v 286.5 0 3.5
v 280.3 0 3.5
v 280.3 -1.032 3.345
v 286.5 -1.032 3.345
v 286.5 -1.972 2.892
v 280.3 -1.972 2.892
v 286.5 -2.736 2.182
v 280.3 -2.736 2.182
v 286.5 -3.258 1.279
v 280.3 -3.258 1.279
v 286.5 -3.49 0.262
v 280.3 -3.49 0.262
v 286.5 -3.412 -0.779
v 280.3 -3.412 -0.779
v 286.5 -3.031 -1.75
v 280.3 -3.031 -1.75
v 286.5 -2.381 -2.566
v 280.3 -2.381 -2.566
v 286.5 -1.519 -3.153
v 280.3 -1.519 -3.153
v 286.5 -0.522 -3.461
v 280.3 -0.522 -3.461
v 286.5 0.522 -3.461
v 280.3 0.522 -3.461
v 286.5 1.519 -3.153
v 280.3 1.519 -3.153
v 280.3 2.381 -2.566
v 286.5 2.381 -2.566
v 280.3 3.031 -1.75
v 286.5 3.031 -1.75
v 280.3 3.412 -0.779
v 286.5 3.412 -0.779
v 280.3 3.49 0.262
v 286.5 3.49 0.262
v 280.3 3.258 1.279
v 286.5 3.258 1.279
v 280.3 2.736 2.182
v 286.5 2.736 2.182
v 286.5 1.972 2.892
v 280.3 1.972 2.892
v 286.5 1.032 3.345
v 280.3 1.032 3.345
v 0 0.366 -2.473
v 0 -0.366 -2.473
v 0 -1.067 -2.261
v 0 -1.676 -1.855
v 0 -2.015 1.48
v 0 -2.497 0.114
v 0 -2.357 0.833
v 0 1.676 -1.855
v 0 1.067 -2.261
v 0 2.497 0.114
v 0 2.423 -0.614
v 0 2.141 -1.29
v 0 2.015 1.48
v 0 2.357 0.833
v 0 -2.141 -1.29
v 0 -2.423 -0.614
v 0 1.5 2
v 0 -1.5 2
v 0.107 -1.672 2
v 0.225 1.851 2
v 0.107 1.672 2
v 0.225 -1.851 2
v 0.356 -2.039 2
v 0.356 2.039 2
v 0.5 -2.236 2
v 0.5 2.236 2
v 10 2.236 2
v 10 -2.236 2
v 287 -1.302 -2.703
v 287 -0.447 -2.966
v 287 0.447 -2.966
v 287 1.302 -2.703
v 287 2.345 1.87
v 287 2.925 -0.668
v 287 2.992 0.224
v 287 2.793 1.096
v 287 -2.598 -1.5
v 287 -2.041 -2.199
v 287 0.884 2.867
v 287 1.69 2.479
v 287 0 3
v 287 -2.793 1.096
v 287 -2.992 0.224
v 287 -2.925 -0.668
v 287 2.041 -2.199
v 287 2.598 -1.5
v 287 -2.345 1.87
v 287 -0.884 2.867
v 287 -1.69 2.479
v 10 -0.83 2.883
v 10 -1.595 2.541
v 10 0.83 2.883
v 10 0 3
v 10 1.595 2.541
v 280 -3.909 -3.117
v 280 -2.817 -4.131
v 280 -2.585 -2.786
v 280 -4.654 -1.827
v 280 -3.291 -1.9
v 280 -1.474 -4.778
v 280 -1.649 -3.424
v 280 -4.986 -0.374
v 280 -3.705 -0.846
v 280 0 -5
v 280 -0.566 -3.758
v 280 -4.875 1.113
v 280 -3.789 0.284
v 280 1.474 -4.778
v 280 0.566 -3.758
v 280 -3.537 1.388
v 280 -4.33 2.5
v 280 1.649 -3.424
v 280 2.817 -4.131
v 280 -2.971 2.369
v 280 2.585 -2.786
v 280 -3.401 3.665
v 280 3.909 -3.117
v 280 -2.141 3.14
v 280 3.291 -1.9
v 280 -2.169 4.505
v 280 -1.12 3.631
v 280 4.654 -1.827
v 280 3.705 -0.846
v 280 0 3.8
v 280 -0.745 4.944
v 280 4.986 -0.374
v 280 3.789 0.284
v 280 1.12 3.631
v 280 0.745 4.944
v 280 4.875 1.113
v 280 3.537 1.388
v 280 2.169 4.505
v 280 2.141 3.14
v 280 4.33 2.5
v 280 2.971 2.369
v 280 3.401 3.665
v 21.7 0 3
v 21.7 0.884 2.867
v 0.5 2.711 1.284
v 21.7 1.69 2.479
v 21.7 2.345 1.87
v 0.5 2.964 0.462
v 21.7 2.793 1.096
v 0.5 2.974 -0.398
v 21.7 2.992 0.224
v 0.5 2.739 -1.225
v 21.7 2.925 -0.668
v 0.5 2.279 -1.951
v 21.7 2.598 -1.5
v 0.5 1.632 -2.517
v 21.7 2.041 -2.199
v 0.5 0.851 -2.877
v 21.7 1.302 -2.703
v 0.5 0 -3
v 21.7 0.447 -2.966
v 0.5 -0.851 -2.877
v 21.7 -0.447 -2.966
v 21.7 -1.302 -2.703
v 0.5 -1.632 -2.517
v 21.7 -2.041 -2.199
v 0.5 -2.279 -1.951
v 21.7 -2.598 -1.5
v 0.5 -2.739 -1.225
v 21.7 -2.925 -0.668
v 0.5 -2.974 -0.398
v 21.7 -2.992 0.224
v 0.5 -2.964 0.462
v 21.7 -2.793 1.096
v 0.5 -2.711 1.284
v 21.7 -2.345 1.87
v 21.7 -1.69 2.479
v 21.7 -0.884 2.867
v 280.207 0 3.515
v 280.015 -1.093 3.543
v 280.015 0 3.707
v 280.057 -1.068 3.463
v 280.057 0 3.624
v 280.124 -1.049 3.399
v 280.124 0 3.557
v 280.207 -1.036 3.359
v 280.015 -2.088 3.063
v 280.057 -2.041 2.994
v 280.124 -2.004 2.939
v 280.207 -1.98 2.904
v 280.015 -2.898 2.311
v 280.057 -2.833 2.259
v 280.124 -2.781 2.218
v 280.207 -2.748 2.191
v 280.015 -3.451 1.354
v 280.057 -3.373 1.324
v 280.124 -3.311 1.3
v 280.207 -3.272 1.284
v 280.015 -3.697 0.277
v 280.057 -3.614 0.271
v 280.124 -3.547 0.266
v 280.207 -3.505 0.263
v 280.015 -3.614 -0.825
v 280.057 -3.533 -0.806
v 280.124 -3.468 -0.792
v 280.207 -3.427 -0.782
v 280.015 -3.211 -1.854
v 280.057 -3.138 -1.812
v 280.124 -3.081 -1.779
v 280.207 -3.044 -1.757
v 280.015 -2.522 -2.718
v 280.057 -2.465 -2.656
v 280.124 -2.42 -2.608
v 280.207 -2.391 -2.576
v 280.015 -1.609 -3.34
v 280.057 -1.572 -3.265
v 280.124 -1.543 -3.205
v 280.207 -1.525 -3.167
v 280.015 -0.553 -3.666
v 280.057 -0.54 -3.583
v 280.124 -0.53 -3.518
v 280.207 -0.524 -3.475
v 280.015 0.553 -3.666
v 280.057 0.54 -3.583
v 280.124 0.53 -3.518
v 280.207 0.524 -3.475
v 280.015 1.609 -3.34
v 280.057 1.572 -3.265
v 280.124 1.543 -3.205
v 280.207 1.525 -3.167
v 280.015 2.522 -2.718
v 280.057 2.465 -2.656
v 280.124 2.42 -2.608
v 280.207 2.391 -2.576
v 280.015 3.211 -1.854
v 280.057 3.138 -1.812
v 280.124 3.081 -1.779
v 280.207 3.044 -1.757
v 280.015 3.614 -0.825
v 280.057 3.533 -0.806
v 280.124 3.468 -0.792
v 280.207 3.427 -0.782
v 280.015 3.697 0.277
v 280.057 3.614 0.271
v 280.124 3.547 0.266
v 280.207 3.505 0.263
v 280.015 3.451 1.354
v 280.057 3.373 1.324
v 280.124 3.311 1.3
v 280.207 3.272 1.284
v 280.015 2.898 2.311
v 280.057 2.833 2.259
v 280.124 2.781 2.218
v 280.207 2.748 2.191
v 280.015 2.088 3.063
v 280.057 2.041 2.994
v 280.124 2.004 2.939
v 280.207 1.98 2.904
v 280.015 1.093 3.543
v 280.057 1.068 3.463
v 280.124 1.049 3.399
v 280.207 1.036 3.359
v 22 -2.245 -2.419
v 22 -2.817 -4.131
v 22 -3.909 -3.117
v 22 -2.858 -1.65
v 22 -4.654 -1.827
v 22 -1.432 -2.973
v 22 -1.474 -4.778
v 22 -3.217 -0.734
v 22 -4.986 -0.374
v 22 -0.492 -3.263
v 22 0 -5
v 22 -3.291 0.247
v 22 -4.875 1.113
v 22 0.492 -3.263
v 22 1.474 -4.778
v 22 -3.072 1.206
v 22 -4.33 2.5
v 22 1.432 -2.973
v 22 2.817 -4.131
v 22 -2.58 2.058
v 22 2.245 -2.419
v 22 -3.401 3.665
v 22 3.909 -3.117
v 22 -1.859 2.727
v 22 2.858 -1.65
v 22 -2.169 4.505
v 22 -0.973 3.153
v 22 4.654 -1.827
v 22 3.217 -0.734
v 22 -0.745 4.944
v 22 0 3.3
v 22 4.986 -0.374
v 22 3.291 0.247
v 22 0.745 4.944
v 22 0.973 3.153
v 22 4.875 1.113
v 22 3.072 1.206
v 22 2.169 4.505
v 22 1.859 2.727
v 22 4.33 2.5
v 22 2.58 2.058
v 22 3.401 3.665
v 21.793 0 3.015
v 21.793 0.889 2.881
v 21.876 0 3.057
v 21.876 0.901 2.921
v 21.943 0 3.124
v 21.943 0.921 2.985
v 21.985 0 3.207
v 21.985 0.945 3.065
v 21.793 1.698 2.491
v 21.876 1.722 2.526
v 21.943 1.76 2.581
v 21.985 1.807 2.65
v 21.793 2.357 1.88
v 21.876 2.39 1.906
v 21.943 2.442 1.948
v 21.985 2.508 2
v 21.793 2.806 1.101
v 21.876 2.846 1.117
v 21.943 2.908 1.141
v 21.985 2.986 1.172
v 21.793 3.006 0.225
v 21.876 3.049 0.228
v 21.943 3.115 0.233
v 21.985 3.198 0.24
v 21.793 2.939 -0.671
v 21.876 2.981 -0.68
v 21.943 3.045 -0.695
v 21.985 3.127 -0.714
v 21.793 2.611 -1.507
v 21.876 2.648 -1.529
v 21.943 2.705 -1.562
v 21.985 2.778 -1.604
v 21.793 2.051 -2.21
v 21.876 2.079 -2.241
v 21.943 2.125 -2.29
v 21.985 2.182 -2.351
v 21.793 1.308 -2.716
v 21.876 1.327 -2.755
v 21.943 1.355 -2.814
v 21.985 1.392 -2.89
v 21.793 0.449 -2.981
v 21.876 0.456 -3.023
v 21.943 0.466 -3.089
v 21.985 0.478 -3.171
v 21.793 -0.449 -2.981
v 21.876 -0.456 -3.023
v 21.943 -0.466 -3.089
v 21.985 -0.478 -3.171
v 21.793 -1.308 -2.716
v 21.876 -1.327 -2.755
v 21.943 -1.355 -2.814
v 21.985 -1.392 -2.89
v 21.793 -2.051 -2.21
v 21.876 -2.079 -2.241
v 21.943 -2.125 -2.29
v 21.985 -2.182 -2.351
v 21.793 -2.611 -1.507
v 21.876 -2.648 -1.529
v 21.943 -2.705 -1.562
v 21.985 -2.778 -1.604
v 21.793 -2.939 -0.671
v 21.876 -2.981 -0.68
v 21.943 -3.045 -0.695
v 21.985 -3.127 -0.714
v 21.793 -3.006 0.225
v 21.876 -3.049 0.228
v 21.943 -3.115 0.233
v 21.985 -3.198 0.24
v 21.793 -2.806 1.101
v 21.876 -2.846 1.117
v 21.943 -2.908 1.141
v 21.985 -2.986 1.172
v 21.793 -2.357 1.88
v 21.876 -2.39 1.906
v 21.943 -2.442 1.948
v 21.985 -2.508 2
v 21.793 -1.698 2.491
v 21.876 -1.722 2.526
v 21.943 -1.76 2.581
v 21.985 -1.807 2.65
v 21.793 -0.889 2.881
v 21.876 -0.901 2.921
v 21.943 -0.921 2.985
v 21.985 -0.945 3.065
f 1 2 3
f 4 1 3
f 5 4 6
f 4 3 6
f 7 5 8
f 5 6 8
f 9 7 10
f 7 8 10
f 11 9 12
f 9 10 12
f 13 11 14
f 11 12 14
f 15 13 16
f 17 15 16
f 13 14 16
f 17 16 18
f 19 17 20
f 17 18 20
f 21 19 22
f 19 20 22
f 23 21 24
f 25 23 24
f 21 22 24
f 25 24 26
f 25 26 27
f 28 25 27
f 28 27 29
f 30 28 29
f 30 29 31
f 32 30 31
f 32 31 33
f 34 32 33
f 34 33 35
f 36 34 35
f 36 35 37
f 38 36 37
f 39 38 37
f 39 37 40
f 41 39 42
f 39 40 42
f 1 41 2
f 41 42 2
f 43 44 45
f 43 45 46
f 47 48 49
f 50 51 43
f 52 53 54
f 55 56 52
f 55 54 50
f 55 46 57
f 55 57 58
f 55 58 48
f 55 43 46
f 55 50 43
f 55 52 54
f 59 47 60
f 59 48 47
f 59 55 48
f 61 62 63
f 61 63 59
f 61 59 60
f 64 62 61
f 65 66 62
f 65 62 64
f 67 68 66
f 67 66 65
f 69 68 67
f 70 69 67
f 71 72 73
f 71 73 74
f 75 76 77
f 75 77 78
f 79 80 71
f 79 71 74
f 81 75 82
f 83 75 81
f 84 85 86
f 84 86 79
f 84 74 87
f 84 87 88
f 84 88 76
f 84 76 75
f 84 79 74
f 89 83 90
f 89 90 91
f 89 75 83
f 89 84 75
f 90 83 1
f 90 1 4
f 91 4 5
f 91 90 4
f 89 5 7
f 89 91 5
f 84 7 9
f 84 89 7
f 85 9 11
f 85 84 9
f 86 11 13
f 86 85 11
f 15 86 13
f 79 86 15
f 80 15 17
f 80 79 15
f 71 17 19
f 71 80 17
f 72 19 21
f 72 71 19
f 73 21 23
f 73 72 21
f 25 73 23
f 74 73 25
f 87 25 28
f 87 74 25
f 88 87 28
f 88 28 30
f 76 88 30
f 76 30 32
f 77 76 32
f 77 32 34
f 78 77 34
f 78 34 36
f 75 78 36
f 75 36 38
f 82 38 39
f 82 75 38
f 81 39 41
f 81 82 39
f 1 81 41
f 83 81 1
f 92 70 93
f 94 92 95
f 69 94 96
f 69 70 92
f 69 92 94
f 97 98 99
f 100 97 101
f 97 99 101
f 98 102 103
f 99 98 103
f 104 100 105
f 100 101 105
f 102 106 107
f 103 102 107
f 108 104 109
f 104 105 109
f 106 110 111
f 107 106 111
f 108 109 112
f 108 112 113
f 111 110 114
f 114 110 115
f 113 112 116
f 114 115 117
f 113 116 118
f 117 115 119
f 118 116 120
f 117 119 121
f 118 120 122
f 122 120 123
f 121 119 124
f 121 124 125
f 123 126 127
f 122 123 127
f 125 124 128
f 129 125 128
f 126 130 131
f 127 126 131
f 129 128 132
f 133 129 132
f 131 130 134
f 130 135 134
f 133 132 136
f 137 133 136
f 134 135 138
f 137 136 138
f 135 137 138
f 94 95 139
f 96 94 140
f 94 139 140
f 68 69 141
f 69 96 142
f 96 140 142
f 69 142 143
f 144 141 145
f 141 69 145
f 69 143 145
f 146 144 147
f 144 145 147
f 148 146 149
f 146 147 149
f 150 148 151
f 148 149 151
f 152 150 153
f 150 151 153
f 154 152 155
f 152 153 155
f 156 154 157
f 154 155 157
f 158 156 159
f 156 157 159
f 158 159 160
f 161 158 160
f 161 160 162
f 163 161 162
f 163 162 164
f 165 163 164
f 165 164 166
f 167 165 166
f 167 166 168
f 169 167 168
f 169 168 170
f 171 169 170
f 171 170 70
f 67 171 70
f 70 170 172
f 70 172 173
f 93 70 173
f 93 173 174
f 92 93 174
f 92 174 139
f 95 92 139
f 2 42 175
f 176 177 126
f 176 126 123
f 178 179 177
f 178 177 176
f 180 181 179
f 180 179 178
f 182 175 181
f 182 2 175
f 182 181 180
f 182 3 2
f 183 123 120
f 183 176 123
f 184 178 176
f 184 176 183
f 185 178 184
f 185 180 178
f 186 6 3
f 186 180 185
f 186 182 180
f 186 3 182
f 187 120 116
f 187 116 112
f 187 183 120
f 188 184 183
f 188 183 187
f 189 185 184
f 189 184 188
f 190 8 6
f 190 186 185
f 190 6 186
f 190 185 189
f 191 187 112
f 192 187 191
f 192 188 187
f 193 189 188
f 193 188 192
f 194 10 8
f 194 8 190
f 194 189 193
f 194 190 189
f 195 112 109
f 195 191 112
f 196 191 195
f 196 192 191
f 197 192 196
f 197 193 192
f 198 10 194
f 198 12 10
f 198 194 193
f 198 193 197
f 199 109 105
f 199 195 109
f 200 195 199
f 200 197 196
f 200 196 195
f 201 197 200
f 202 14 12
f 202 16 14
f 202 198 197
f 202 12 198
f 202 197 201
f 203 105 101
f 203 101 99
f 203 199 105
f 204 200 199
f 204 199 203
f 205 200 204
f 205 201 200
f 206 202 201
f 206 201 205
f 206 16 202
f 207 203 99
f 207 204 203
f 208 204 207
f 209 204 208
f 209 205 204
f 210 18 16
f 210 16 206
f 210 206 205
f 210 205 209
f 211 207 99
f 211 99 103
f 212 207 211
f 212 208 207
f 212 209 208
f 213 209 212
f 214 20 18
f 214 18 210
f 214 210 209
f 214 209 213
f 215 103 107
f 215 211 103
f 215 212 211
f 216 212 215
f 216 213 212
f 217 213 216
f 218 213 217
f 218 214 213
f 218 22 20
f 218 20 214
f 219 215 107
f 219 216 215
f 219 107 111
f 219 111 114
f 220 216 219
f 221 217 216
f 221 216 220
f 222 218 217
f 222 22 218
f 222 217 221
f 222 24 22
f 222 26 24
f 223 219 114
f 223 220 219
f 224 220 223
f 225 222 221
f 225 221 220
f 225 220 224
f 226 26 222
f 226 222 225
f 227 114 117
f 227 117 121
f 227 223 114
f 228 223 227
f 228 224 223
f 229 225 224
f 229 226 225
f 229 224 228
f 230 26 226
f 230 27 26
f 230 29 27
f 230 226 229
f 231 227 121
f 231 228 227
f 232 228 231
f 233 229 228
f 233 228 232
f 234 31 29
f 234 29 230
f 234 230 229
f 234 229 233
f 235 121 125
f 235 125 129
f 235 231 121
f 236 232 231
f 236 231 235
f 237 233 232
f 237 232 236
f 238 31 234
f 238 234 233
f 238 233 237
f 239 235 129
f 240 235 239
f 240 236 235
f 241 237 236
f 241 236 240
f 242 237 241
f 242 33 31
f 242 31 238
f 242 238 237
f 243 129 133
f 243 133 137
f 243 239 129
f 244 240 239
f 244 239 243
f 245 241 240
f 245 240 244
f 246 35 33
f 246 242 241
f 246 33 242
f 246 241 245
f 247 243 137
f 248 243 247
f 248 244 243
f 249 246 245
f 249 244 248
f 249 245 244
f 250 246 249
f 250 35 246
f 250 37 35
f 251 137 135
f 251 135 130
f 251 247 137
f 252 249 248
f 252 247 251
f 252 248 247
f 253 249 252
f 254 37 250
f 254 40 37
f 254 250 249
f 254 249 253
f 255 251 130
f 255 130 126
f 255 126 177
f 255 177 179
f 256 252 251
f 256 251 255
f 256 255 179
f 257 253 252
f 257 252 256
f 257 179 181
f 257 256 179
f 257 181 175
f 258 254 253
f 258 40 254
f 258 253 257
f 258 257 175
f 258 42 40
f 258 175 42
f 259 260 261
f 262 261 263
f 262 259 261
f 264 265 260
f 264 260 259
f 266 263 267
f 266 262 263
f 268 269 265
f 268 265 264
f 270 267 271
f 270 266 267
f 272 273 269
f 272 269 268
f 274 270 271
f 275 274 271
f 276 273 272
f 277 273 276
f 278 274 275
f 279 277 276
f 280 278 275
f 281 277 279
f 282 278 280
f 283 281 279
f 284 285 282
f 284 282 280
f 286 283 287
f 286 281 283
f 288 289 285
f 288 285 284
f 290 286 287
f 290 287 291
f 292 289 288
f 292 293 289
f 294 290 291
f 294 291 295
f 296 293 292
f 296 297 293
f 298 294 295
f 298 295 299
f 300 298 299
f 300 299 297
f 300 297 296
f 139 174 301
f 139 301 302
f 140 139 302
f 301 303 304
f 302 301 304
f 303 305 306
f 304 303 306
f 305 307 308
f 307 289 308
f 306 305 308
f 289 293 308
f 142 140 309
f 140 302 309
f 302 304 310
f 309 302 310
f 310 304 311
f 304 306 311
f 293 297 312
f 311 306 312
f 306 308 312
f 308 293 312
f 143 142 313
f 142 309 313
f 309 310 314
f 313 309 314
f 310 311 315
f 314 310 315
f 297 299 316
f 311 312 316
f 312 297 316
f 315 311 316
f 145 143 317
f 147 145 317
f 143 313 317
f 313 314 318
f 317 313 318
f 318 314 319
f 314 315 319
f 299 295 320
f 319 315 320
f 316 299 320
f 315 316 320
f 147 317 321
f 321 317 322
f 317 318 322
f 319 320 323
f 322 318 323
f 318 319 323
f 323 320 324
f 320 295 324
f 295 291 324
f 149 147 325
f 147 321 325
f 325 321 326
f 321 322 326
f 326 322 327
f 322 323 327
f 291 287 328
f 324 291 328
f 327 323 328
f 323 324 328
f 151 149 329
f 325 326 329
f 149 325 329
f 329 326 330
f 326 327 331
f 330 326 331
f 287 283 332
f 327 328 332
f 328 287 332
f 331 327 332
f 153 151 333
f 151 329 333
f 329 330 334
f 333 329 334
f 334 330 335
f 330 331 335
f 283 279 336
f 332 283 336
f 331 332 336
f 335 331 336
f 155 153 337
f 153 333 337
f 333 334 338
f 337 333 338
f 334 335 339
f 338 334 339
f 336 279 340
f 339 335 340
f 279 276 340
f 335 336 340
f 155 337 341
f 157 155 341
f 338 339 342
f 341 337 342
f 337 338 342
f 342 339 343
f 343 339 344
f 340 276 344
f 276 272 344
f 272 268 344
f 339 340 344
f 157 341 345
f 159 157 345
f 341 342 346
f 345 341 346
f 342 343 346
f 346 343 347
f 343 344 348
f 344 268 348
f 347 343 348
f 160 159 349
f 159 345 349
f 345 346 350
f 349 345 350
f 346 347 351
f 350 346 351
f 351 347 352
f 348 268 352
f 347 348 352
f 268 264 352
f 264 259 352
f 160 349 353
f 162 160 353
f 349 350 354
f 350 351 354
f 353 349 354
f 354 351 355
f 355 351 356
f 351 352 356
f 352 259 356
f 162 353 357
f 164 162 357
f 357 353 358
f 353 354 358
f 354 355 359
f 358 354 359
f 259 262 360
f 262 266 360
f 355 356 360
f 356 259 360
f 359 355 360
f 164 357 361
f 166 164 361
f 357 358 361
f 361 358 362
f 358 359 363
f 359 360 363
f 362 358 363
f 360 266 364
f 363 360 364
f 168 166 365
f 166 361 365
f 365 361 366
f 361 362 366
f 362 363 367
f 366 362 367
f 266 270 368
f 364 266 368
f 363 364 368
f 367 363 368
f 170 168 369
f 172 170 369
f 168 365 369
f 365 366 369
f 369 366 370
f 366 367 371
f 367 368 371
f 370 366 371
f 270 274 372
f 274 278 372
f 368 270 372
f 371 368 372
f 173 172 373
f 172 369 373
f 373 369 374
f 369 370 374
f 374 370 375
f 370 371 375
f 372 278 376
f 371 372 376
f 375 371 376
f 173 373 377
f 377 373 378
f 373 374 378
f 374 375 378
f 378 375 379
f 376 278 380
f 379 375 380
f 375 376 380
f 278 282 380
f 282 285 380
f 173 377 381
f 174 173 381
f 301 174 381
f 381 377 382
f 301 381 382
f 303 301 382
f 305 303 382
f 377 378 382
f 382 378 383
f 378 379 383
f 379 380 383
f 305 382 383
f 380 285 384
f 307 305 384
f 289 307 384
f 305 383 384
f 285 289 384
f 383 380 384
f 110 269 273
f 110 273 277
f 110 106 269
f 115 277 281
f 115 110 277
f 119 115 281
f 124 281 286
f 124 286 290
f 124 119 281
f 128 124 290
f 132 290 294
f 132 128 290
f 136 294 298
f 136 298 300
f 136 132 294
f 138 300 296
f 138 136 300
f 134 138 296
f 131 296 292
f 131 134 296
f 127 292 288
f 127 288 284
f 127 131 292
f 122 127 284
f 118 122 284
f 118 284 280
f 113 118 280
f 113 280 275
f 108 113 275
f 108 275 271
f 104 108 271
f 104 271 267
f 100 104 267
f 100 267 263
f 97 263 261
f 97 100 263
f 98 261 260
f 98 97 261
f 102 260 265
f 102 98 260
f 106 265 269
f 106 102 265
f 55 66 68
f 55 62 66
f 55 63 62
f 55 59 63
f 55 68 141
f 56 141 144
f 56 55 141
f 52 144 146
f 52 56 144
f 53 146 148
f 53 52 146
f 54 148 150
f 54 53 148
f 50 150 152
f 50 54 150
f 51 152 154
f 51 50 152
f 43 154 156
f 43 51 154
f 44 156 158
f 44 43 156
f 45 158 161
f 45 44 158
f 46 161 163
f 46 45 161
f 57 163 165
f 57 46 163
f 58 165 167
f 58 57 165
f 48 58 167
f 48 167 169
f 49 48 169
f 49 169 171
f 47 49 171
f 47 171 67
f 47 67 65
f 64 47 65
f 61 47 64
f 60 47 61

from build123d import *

# Parameters (mm, degrees)
SKETCH1_W           = 258
SKETCH1_H           = 5
SKETCH2_R           = 3
BOSS_EXTRUDE1_DEPTH = 22
CUT_EXTRUDE1_START  = -10
CUT_EXTRUDE1_DEPTH  = 10
SKETCH4_R           = 3.5
BOSS_EXTRUDE2_DEPTH = 7
CHAMFER1_SIZE       = 0.5
FILLET1_R           = 0.3


with BuildPart() as part:
    # Sketch1 → Revolve1 (revolve)
    with BuildSketch(Plane.XY, mode=Mode.PRIVATE) as revolve1_sk:
        with Locations((151, 2.5)):
            Rectangle(SKETCH1_W, SKETCH1_H)
    revolve(revolve1_sk.sketch.rotate(Axis((22, 0, 0), (1, 0, 0)), 270), axis=Axis((22, 0, 0), (1, 0, 0)))

    # Sketch2 → Boss-Extrude1 (add)
    with BuildSketch(Plane.ZY.offset(-22)):
        Circle(SKETCH2_R)
    extrude(amount=BOSS_EXTRUDE1_DEPTH)

    # Sketch3 → Cut-Extrude1 (cut)
    with BuildSketch(Plane.ZY.offset(CUT_EXTRUDE1_START)):
        with BuildLine():
            Line((2, 2.236067977), (2, -2.236067977))
            ThreePointArc((2, -2.236067977), (3, 0), (2, 2.236067977))
        make_face()
    extrude(amount=CUT_EXTRUDE1_DEPTH, mode=Mode.SUBTRACT)

    # Sketch4 → Boss-Extrude2 (add)
    with BuildSketch(Plane(origin=(280, 0, 0), x_dir=(0, 0, -1), z_dir=(1, 0, 0))):
        with Locations(Location((0, 0, 0), (0, 0, 180))):
            Circle(SKETCH4_R)
    extrude(amount=BOSS_EXTRUDE2_DEPTH)

    # Chamfer1
    chamfer1_edges = [part.edges().sort_by_distance(p)[0] for p in [
        (287, 0, -3.5),
        (0, 0, -3),
    ]]
    chamfer(chamfer1_edges, length=CHAMFER1_SIZE)

    # Fillet1
    fillet1_edges = [part.edges().sort_by_distance(p)[0] for p in [
        (280, 0, -3.5),
        (22, 0, -3),
    ]]
    fillet(fillet1_edges, radius=FILLET1_R)


solid = part.part
